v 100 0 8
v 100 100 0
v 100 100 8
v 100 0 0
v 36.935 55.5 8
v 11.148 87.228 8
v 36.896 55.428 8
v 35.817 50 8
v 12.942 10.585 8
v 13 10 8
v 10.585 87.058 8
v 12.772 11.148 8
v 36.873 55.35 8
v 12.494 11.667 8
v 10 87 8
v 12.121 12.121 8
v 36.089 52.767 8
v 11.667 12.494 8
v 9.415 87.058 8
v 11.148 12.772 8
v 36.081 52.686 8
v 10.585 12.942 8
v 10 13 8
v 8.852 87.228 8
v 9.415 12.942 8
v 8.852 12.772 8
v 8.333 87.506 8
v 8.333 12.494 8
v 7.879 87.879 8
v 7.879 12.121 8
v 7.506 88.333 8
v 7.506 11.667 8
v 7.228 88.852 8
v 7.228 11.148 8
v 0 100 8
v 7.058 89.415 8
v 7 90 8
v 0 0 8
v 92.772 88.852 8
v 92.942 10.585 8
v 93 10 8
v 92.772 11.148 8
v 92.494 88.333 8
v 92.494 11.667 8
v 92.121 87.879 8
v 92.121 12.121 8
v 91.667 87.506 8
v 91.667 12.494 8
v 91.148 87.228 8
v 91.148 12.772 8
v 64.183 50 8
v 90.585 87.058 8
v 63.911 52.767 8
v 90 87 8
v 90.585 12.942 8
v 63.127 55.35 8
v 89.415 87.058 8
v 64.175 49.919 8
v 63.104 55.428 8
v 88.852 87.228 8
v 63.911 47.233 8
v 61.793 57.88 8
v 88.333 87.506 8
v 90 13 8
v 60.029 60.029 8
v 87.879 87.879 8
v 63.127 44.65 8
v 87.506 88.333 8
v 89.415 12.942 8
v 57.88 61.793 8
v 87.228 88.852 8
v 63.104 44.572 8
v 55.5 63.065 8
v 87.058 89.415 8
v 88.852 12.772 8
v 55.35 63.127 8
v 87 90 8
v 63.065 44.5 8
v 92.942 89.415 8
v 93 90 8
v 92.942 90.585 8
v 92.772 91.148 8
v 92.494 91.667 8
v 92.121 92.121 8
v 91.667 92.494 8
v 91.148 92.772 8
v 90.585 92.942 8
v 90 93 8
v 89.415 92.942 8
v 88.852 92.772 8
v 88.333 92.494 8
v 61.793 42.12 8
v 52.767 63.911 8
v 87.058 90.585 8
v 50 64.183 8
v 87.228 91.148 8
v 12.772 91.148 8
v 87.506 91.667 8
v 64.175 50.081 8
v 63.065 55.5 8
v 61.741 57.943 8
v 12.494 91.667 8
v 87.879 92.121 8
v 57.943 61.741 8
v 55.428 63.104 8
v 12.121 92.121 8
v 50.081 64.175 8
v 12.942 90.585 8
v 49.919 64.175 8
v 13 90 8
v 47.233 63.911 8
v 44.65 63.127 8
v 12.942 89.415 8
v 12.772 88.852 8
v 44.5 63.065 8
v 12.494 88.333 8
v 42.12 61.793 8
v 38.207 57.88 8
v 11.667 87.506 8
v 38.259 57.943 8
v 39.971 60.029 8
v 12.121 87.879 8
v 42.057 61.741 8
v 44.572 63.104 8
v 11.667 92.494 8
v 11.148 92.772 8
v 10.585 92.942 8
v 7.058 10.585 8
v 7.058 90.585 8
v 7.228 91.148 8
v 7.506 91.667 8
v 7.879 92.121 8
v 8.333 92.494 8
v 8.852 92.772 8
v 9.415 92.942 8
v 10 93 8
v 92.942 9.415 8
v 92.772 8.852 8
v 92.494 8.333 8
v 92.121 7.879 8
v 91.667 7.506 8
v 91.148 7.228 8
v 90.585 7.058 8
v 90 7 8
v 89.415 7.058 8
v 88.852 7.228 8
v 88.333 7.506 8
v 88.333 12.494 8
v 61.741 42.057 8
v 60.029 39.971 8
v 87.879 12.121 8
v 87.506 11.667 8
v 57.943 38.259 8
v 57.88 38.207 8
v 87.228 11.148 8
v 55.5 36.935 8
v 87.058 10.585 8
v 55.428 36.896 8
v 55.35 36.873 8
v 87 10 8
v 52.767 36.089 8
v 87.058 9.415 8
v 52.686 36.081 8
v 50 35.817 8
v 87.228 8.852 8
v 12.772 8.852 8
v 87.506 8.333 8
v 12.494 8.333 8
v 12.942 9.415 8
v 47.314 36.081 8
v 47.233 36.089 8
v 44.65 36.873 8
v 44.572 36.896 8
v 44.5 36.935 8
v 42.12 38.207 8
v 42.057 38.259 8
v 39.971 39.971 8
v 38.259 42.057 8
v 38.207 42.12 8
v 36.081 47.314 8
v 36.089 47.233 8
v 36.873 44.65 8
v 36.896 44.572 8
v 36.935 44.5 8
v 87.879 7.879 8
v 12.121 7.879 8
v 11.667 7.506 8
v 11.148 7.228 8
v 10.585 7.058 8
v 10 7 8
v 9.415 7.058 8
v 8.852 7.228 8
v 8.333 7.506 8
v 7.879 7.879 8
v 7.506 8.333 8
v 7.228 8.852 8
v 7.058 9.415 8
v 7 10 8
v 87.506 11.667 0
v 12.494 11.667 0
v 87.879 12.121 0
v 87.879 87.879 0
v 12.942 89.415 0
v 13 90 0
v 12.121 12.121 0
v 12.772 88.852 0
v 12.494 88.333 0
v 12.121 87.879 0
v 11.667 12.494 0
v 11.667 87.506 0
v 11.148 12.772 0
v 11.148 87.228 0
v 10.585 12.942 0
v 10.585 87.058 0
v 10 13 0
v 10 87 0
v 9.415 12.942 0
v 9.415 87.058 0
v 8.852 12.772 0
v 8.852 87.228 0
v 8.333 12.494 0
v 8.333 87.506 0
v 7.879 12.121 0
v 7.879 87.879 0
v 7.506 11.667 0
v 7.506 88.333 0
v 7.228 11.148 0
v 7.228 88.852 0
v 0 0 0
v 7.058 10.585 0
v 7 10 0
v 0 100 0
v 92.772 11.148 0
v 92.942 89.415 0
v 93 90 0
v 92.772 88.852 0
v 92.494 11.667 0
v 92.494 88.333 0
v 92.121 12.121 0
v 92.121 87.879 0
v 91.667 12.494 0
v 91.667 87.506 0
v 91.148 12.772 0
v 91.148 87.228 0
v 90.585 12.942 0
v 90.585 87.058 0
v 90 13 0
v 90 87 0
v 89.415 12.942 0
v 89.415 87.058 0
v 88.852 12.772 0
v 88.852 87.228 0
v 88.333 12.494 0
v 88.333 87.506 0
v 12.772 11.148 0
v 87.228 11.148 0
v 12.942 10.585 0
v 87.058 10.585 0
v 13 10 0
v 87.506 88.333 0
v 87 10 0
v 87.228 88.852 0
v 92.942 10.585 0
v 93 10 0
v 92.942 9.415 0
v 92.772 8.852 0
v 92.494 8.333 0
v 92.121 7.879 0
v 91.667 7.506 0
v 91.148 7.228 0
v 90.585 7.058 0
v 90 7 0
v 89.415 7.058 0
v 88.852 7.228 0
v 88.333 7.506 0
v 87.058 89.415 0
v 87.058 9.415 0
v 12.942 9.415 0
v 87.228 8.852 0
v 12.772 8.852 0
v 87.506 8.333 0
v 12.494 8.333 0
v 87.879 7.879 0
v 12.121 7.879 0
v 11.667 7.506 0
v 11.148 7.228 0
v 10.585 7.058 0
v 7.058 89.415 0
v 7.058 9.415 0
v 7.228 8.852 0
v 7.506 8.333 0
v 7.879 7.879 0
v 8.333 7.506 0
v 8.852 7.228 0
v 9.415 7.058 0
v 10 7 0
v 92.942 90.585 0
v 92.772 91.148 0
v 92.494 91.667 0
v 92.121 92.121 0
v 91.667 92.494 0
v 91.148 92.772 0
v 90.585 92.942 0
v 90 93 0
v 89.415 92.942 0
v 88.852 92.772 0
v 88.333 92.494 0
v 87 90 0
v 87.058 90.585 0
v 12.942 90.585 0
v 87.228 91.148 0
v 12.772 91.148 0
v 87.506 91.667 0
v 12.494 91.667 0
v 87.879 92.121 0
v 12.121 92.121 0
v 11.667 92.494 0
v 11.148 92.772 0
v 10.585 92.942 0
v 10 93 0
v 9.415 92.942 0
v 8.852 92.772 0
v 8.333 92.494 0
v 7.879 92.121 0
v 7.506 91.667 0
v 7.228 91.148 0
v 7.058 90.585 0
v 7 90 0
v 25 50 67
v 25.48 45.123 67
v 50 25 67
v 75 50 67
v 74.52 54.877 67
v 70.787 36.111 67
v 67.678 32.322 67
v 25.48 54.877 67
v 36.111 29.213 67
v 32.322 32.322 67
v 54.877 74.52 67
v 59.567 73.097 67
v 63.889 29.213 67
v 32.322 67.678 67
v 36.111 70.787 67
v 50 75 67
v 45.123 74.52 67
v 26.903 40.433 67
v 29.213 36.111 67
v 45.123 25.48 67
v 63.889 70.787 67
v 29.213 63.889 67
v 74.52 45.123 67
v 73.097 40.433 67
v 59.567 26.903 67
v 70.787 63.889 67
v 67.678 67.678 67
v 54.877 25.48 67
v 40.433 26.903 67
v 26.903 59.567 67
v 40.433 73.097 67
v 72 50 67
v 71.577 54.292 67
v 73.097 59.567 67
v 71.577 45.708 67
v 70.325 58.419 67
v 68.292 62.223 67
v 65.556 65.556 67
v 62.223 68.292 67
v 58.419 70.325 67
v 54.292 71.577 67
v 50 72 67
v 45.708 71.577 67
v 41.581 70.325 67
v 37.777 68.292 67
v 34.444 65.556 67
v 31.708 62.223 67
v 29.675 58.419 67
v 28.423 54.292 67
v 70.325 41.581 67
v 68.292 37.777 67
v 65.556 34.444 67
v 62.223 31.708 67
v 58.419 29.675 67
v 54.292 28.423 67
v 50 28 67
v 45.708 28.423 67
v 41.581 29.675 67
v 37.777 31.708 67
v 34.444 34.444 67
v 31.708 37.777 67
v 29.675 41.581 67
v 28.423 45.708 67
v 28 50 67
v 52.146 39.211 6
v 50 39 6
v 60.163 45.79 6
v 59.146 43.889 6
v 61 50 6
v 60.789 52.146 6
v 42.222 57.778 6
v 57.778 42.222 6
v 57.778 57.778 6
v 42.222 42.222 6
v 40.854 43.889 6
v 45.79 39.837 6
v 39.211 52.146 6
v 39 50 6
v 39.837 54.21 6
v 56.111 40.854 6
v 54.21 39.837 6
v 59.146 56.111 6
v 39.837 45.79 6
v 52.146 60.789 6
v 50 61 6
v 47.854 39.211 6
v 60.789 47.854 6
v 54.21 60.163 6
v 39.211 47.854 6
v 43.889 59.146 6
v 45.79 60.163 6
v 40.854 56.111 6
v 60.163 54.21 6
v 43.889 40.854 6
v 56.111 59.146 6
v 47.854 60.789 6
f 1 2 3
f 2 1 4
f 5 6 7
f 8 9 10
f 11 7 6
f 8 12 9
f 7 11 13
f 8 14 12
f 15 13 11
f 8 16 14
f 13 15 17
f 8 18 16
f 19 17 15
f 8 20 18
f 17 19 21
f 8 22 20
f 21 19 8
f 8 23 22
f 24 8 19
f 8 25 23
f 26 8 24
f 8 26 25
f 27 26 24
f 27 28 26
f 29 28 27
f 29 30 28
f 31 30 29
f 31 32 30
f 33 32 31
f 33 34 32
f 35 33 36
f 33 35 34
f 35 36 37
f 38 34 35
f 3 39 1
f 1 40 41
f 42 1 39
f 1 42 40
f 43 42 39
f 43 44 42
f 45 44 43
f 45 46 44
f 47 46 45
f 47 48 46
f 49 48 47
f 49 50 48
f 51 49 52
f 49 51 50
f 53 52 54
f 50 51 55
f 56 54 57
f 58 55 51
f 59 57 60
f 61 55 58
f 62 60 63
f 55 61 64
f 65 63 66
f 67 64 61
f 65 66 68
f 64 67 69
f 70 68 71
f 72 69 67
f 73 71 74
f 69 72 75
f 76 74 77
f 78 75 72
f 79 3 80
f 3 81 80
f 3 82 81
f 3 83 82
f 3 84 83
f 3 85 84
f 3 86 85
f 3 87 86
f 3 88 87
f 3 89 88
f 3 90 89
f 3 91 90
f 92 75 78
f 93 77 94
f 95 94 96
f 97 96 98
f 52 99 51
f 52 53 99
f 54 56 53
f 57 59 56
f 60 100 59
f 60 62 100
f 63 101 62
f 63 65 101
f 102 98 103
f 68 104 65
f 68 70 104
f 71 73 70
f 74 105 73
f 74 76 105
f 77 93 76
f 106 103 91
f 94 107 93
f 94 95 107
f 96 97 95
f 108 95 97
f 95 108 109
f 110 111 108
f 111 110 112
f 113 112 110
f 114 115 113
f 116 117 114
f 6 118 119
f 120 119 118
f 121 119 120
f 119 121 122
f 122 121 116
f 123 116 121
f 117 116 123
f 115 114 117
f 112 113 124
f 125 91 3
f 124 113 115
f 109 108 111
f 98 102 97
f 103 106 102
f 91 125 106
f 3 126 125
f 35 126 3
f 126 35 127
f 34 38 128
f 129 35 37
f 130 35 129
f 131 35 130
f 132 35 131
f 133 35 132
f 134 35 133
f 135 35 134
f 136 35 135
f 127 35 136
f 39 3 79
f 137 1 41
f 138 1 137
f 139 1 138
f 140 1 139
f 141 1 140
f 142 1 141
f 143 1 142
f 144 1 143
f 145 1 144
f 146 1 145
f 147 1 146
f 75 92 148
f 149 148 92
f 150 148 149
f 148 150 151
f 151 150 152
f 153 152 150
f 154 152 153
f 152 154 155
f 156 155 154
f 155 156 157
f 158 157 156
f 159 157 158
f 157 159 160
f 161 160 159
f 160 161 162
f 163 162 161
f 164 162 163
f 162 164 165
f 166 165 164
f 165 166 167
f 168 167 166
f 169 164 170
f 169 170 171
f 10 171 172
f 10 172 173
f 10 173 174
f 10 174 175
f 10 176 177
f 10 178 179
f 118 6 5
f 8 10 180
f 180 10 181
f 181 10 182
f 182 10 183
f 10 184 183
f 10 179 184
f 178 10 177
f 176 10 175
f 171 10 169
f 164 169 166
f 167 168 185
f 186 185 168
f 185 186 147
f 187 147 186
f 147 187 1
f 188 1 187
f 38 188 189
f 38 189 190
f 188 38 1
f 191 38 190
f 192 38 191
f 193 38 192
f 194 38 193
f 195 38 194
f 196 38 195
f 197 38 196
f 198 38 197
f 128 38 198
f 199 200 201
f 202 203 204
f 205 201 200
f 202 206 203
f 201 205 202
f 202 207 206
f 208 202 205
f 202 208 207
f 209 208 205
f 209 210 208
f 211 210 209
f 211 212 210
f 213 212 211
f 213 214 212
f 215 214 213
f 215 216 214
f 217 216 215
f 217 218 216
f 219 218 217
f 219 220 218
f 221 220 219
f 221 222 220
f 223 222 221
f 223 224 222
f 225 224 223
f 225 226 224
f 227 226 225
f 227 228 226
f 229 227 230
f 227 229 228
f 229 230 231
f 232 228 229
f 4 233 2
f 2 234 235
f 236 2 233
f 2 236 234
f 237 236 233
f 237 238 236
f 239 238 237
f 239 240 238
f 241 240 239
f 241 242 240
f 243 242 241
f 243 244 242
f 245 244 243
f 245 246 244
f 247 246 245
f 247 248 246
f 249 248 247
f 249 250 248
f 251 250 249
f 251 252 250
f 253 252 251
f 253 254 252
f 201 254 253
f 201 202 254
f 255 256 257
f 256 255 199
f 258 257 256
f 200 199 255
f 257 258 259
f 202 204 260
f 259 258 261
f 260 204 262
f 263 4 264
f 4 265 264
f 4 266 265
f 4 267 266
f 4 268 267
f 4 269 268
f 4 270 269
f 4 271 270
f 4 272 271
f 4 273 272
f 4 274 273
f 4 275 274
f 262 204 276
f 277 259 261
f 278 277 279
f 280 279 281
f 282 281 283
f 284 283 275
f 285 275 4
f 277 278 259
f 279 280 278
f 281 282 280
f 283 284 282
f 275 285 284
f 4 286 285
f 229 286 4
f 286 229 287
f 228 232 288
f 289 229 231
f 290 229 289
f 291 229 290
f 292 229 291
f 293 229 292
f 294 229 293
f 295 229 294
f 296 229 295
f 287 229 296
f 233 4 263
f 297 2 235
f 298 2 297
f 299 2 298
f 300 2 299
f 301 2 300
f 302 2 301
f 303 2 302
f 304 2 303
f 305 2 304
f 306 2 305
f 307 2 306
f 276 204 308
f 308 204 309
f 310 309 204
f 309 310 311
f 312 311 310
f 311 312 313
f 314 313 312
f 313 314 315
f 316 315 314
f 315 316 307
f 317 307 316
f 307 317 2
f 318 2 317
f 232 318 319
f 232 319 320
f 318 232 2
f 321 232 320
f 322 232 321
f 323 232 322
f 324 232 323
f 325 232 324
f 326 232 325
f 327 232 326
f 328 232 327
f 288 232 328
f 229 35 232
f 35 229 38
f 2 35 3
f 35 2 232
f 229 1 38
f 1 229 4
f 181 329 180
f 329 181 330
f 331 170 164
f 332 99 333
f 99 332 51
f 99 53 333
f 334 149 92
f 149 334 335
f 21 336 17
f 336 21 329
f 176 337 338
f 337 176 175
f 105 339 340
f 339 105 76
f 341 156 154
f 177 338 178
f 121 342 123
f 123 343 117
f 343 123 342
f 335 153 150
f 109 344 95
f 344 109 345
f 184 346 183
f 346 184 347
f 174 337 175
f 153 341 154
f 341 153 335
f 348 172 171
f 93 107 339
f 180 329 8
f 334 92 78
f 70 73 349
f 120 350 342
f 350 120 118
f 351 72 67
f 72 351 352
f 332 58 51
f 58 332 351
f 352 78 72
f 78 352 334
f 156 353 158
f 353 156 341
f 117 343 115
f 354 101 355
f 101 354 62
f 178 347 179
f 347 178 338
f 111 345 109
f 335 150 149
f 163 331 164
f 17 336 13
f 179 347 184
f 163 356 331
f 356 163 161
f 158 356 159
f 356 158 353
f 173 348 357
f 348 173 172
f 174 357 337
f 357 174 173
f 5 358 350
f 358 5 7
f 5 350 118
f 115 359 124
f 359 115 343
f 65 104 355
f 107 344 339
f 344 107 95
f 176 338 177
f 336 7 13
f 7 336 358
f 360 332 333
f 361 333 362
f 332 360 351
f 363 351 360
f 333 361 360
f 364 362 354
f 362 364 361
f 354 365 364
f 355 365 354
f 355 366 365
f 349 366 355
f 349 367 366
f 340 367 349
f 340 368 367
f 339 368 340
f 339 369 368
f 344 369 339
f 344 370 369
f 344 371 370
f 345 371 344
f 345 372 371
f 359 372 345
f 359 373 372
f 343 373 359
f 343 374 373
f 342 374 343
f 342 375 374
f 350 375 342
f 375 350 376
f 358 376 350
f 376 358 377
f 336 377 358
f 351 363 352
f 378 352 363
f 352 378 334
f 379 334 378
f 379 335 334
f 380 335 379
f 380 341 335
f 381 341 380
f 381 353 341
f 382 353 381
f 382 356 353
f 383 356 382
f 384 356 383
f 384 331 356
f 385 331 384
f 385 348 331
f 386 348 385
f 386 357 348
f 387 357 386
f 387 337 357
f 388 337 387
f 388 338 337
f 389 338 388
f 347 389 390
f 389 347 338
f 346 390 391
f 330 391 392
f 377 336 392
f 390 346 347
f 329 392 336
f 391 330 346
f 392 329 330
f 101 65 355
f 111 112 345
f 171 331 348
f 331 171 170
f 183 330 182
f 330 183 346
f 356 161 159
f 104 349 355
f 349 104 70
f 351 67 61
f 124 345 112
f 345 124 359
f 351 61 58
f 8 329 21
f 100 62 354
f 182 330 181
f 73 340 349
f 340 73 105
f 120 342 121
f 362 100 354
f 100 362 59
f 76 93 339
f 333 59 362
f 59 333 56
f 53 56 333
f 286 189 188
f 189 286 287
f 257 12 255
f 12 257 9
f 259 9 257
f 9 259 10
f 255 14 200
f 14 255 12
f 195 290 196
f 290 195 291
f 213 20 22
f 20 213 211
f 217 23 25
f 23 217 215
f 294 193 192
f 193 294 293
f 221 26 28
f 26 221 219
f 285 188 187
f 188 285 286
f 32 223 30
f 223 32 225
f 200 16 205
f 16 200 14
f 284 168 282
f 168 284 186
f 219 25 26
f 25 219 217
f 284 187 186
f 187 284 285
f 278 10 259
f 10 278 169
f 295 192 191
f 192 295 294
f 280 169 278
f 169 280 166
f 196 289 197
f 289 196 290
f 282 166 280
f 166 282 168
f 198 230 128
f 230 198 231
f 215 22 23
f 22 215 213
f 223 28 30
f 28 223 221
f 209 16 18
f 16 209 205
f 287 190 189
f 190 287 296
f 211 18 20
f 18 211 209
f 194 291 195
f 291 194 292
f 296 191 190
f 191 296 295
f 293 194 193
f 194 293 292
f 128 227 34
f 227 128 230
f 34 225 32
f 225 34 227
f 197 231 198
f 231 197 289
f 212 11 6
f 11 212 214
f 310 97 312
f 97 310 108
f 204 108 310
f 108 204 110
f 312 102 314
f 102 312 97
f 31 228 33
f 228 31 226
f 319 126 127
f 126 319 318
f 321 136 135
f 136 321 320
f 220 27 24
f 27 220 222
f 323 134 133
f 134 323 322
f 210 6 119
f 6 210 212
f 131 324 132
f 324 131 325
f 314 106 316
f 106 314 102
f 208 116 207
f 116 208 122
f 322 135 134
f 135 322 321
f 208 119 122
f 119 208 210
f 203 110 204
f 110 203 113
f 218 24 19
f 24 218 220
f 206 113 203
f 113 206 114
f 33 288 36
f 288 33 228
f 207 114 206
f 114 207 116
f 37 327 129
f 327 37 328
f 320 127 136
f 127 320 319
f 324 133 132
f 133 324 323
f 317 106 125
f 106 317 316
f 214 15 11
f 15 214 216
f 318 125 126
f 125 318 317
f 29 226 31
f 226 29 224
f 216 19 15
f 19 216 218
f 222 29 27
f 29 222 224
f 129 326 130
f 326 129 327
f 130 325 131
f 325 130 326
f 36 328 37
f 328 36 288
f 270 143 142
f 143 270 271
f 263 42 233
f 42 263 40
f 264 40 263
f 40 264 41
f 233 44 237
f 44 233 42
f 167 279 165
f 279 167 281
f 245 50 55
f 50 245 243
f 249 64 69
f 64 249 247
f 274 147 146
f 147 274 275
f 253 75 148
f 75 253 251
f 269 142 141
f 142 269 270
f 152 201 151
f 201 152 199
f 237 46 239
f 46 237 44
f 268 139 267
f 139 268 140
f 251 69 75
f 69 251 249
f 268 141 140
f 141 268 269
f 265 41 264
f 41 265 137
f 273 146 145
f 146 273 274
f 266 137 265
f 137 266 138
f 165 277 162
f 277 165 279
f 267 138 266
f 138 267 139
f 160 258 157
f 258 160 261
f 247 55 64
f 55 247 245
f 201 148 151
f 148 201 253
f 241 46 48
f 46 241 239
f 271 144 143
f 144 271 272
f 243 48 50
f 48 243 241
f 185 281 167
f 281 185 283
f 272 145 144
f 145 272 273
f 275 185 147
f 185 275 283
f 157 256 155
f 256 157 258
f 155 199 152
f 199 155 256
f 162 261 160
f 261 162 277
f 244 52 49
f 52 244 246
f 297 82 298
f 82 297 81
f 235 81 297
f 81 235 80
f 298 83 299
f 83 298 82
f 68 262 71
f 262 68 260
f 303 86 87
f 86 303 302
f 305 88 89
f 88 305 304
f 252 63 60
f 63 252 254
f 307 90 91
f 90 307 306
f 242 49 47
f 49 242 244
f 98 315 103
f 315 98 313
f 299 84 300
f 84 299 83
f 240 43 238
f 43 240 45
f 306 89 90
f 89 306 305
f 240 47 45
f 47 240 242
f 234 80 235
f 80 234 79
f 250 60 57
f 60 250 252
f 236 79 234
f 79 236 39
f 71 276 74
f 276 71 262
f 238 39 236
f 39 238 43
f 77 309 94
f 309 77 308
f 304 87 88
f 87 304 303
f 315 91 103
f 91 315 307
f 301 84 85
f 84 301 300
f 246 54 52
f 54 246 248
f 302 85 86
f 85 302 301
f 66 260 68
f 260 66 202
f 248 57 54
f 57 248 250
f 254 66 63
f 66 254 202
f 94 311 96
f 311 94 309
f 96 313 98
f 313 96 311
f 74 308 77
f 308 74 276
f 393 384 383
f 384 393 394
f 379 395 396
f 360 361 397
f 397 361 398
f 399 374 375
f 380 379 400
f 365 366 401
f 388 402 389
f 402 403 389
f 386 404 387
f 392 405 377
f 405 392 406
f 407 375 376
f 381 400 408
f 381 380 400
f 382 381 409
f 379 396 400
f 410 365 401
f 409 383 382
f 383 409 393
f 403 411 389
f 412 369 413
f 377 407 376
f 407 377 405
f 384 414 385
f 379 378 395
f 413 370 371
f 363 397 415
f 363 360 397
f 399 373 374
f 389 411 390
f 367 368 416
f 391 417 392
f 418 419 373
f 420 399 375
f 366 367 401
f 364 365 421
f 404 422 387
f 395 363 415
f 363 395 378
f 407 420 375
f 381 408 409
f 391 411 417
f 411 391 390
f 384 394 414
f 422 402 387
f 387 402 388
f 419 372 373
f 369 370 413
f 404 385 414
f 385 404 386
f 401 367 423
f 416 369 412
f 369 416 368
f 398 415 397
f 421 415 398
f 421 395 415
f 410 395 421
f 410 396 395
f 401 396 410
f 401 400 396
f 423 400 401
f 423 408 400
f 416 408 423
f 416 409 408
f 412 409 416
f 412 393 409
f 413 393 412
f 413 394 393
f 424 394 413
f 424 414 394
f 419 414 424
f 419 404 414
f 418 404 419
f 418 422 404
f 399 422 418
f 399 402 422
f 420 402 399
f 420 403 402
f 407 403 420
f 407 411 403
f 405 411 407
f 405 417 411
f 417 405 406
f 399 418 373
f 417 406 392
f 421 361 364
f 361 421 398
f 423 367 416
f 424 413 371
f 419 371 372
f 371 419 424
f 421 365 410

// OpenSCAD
$fn = 32;

// ----------------------------------------------------------------------
// Hopper: flanged with square flange
// ----------------------------------------------------------------------

// --- parameters (mm) ---
fl = 100;                 // flange side, X and Y
fl_t = 8;                 // flange thickness
cone_h = 60;              // cone height above the flange
top_d = 50;               // cone mouth diameter
bot_d = 28;               // cone spout diameter
wall = 3;                 // cone wall thickness
hole_r = 3;               // flange hole radius
hole_in = 10;             // hole inset from the corners

bore_d = bot_d - 2 * wall;  // spout bore diameter
total_h = fl_t + cone_h - 1;  // overall height

difference() {
  union() {
    cube([fl, fl, fl_t]);
    translate([fl / 2, fl / 2, fl_t - 1])
      cylinder(h = cone_h, d1 = bot_d, d2 = top_d);
  }
  translate([fl / 2, fl / 2, fl_t - 2])
    cylinder(h = cone_h + 1, d1 = bore_d, d2 = top_d - 2 * wall);
  for (sx = [0, 1], sy = [0, 1])
    translate([sx ? fl - hole_in : hole_in,
               sy ? fl - hole_in : hole_in, -1])
      cylinder(r = hole_r, h = fl_t + 2);
}
